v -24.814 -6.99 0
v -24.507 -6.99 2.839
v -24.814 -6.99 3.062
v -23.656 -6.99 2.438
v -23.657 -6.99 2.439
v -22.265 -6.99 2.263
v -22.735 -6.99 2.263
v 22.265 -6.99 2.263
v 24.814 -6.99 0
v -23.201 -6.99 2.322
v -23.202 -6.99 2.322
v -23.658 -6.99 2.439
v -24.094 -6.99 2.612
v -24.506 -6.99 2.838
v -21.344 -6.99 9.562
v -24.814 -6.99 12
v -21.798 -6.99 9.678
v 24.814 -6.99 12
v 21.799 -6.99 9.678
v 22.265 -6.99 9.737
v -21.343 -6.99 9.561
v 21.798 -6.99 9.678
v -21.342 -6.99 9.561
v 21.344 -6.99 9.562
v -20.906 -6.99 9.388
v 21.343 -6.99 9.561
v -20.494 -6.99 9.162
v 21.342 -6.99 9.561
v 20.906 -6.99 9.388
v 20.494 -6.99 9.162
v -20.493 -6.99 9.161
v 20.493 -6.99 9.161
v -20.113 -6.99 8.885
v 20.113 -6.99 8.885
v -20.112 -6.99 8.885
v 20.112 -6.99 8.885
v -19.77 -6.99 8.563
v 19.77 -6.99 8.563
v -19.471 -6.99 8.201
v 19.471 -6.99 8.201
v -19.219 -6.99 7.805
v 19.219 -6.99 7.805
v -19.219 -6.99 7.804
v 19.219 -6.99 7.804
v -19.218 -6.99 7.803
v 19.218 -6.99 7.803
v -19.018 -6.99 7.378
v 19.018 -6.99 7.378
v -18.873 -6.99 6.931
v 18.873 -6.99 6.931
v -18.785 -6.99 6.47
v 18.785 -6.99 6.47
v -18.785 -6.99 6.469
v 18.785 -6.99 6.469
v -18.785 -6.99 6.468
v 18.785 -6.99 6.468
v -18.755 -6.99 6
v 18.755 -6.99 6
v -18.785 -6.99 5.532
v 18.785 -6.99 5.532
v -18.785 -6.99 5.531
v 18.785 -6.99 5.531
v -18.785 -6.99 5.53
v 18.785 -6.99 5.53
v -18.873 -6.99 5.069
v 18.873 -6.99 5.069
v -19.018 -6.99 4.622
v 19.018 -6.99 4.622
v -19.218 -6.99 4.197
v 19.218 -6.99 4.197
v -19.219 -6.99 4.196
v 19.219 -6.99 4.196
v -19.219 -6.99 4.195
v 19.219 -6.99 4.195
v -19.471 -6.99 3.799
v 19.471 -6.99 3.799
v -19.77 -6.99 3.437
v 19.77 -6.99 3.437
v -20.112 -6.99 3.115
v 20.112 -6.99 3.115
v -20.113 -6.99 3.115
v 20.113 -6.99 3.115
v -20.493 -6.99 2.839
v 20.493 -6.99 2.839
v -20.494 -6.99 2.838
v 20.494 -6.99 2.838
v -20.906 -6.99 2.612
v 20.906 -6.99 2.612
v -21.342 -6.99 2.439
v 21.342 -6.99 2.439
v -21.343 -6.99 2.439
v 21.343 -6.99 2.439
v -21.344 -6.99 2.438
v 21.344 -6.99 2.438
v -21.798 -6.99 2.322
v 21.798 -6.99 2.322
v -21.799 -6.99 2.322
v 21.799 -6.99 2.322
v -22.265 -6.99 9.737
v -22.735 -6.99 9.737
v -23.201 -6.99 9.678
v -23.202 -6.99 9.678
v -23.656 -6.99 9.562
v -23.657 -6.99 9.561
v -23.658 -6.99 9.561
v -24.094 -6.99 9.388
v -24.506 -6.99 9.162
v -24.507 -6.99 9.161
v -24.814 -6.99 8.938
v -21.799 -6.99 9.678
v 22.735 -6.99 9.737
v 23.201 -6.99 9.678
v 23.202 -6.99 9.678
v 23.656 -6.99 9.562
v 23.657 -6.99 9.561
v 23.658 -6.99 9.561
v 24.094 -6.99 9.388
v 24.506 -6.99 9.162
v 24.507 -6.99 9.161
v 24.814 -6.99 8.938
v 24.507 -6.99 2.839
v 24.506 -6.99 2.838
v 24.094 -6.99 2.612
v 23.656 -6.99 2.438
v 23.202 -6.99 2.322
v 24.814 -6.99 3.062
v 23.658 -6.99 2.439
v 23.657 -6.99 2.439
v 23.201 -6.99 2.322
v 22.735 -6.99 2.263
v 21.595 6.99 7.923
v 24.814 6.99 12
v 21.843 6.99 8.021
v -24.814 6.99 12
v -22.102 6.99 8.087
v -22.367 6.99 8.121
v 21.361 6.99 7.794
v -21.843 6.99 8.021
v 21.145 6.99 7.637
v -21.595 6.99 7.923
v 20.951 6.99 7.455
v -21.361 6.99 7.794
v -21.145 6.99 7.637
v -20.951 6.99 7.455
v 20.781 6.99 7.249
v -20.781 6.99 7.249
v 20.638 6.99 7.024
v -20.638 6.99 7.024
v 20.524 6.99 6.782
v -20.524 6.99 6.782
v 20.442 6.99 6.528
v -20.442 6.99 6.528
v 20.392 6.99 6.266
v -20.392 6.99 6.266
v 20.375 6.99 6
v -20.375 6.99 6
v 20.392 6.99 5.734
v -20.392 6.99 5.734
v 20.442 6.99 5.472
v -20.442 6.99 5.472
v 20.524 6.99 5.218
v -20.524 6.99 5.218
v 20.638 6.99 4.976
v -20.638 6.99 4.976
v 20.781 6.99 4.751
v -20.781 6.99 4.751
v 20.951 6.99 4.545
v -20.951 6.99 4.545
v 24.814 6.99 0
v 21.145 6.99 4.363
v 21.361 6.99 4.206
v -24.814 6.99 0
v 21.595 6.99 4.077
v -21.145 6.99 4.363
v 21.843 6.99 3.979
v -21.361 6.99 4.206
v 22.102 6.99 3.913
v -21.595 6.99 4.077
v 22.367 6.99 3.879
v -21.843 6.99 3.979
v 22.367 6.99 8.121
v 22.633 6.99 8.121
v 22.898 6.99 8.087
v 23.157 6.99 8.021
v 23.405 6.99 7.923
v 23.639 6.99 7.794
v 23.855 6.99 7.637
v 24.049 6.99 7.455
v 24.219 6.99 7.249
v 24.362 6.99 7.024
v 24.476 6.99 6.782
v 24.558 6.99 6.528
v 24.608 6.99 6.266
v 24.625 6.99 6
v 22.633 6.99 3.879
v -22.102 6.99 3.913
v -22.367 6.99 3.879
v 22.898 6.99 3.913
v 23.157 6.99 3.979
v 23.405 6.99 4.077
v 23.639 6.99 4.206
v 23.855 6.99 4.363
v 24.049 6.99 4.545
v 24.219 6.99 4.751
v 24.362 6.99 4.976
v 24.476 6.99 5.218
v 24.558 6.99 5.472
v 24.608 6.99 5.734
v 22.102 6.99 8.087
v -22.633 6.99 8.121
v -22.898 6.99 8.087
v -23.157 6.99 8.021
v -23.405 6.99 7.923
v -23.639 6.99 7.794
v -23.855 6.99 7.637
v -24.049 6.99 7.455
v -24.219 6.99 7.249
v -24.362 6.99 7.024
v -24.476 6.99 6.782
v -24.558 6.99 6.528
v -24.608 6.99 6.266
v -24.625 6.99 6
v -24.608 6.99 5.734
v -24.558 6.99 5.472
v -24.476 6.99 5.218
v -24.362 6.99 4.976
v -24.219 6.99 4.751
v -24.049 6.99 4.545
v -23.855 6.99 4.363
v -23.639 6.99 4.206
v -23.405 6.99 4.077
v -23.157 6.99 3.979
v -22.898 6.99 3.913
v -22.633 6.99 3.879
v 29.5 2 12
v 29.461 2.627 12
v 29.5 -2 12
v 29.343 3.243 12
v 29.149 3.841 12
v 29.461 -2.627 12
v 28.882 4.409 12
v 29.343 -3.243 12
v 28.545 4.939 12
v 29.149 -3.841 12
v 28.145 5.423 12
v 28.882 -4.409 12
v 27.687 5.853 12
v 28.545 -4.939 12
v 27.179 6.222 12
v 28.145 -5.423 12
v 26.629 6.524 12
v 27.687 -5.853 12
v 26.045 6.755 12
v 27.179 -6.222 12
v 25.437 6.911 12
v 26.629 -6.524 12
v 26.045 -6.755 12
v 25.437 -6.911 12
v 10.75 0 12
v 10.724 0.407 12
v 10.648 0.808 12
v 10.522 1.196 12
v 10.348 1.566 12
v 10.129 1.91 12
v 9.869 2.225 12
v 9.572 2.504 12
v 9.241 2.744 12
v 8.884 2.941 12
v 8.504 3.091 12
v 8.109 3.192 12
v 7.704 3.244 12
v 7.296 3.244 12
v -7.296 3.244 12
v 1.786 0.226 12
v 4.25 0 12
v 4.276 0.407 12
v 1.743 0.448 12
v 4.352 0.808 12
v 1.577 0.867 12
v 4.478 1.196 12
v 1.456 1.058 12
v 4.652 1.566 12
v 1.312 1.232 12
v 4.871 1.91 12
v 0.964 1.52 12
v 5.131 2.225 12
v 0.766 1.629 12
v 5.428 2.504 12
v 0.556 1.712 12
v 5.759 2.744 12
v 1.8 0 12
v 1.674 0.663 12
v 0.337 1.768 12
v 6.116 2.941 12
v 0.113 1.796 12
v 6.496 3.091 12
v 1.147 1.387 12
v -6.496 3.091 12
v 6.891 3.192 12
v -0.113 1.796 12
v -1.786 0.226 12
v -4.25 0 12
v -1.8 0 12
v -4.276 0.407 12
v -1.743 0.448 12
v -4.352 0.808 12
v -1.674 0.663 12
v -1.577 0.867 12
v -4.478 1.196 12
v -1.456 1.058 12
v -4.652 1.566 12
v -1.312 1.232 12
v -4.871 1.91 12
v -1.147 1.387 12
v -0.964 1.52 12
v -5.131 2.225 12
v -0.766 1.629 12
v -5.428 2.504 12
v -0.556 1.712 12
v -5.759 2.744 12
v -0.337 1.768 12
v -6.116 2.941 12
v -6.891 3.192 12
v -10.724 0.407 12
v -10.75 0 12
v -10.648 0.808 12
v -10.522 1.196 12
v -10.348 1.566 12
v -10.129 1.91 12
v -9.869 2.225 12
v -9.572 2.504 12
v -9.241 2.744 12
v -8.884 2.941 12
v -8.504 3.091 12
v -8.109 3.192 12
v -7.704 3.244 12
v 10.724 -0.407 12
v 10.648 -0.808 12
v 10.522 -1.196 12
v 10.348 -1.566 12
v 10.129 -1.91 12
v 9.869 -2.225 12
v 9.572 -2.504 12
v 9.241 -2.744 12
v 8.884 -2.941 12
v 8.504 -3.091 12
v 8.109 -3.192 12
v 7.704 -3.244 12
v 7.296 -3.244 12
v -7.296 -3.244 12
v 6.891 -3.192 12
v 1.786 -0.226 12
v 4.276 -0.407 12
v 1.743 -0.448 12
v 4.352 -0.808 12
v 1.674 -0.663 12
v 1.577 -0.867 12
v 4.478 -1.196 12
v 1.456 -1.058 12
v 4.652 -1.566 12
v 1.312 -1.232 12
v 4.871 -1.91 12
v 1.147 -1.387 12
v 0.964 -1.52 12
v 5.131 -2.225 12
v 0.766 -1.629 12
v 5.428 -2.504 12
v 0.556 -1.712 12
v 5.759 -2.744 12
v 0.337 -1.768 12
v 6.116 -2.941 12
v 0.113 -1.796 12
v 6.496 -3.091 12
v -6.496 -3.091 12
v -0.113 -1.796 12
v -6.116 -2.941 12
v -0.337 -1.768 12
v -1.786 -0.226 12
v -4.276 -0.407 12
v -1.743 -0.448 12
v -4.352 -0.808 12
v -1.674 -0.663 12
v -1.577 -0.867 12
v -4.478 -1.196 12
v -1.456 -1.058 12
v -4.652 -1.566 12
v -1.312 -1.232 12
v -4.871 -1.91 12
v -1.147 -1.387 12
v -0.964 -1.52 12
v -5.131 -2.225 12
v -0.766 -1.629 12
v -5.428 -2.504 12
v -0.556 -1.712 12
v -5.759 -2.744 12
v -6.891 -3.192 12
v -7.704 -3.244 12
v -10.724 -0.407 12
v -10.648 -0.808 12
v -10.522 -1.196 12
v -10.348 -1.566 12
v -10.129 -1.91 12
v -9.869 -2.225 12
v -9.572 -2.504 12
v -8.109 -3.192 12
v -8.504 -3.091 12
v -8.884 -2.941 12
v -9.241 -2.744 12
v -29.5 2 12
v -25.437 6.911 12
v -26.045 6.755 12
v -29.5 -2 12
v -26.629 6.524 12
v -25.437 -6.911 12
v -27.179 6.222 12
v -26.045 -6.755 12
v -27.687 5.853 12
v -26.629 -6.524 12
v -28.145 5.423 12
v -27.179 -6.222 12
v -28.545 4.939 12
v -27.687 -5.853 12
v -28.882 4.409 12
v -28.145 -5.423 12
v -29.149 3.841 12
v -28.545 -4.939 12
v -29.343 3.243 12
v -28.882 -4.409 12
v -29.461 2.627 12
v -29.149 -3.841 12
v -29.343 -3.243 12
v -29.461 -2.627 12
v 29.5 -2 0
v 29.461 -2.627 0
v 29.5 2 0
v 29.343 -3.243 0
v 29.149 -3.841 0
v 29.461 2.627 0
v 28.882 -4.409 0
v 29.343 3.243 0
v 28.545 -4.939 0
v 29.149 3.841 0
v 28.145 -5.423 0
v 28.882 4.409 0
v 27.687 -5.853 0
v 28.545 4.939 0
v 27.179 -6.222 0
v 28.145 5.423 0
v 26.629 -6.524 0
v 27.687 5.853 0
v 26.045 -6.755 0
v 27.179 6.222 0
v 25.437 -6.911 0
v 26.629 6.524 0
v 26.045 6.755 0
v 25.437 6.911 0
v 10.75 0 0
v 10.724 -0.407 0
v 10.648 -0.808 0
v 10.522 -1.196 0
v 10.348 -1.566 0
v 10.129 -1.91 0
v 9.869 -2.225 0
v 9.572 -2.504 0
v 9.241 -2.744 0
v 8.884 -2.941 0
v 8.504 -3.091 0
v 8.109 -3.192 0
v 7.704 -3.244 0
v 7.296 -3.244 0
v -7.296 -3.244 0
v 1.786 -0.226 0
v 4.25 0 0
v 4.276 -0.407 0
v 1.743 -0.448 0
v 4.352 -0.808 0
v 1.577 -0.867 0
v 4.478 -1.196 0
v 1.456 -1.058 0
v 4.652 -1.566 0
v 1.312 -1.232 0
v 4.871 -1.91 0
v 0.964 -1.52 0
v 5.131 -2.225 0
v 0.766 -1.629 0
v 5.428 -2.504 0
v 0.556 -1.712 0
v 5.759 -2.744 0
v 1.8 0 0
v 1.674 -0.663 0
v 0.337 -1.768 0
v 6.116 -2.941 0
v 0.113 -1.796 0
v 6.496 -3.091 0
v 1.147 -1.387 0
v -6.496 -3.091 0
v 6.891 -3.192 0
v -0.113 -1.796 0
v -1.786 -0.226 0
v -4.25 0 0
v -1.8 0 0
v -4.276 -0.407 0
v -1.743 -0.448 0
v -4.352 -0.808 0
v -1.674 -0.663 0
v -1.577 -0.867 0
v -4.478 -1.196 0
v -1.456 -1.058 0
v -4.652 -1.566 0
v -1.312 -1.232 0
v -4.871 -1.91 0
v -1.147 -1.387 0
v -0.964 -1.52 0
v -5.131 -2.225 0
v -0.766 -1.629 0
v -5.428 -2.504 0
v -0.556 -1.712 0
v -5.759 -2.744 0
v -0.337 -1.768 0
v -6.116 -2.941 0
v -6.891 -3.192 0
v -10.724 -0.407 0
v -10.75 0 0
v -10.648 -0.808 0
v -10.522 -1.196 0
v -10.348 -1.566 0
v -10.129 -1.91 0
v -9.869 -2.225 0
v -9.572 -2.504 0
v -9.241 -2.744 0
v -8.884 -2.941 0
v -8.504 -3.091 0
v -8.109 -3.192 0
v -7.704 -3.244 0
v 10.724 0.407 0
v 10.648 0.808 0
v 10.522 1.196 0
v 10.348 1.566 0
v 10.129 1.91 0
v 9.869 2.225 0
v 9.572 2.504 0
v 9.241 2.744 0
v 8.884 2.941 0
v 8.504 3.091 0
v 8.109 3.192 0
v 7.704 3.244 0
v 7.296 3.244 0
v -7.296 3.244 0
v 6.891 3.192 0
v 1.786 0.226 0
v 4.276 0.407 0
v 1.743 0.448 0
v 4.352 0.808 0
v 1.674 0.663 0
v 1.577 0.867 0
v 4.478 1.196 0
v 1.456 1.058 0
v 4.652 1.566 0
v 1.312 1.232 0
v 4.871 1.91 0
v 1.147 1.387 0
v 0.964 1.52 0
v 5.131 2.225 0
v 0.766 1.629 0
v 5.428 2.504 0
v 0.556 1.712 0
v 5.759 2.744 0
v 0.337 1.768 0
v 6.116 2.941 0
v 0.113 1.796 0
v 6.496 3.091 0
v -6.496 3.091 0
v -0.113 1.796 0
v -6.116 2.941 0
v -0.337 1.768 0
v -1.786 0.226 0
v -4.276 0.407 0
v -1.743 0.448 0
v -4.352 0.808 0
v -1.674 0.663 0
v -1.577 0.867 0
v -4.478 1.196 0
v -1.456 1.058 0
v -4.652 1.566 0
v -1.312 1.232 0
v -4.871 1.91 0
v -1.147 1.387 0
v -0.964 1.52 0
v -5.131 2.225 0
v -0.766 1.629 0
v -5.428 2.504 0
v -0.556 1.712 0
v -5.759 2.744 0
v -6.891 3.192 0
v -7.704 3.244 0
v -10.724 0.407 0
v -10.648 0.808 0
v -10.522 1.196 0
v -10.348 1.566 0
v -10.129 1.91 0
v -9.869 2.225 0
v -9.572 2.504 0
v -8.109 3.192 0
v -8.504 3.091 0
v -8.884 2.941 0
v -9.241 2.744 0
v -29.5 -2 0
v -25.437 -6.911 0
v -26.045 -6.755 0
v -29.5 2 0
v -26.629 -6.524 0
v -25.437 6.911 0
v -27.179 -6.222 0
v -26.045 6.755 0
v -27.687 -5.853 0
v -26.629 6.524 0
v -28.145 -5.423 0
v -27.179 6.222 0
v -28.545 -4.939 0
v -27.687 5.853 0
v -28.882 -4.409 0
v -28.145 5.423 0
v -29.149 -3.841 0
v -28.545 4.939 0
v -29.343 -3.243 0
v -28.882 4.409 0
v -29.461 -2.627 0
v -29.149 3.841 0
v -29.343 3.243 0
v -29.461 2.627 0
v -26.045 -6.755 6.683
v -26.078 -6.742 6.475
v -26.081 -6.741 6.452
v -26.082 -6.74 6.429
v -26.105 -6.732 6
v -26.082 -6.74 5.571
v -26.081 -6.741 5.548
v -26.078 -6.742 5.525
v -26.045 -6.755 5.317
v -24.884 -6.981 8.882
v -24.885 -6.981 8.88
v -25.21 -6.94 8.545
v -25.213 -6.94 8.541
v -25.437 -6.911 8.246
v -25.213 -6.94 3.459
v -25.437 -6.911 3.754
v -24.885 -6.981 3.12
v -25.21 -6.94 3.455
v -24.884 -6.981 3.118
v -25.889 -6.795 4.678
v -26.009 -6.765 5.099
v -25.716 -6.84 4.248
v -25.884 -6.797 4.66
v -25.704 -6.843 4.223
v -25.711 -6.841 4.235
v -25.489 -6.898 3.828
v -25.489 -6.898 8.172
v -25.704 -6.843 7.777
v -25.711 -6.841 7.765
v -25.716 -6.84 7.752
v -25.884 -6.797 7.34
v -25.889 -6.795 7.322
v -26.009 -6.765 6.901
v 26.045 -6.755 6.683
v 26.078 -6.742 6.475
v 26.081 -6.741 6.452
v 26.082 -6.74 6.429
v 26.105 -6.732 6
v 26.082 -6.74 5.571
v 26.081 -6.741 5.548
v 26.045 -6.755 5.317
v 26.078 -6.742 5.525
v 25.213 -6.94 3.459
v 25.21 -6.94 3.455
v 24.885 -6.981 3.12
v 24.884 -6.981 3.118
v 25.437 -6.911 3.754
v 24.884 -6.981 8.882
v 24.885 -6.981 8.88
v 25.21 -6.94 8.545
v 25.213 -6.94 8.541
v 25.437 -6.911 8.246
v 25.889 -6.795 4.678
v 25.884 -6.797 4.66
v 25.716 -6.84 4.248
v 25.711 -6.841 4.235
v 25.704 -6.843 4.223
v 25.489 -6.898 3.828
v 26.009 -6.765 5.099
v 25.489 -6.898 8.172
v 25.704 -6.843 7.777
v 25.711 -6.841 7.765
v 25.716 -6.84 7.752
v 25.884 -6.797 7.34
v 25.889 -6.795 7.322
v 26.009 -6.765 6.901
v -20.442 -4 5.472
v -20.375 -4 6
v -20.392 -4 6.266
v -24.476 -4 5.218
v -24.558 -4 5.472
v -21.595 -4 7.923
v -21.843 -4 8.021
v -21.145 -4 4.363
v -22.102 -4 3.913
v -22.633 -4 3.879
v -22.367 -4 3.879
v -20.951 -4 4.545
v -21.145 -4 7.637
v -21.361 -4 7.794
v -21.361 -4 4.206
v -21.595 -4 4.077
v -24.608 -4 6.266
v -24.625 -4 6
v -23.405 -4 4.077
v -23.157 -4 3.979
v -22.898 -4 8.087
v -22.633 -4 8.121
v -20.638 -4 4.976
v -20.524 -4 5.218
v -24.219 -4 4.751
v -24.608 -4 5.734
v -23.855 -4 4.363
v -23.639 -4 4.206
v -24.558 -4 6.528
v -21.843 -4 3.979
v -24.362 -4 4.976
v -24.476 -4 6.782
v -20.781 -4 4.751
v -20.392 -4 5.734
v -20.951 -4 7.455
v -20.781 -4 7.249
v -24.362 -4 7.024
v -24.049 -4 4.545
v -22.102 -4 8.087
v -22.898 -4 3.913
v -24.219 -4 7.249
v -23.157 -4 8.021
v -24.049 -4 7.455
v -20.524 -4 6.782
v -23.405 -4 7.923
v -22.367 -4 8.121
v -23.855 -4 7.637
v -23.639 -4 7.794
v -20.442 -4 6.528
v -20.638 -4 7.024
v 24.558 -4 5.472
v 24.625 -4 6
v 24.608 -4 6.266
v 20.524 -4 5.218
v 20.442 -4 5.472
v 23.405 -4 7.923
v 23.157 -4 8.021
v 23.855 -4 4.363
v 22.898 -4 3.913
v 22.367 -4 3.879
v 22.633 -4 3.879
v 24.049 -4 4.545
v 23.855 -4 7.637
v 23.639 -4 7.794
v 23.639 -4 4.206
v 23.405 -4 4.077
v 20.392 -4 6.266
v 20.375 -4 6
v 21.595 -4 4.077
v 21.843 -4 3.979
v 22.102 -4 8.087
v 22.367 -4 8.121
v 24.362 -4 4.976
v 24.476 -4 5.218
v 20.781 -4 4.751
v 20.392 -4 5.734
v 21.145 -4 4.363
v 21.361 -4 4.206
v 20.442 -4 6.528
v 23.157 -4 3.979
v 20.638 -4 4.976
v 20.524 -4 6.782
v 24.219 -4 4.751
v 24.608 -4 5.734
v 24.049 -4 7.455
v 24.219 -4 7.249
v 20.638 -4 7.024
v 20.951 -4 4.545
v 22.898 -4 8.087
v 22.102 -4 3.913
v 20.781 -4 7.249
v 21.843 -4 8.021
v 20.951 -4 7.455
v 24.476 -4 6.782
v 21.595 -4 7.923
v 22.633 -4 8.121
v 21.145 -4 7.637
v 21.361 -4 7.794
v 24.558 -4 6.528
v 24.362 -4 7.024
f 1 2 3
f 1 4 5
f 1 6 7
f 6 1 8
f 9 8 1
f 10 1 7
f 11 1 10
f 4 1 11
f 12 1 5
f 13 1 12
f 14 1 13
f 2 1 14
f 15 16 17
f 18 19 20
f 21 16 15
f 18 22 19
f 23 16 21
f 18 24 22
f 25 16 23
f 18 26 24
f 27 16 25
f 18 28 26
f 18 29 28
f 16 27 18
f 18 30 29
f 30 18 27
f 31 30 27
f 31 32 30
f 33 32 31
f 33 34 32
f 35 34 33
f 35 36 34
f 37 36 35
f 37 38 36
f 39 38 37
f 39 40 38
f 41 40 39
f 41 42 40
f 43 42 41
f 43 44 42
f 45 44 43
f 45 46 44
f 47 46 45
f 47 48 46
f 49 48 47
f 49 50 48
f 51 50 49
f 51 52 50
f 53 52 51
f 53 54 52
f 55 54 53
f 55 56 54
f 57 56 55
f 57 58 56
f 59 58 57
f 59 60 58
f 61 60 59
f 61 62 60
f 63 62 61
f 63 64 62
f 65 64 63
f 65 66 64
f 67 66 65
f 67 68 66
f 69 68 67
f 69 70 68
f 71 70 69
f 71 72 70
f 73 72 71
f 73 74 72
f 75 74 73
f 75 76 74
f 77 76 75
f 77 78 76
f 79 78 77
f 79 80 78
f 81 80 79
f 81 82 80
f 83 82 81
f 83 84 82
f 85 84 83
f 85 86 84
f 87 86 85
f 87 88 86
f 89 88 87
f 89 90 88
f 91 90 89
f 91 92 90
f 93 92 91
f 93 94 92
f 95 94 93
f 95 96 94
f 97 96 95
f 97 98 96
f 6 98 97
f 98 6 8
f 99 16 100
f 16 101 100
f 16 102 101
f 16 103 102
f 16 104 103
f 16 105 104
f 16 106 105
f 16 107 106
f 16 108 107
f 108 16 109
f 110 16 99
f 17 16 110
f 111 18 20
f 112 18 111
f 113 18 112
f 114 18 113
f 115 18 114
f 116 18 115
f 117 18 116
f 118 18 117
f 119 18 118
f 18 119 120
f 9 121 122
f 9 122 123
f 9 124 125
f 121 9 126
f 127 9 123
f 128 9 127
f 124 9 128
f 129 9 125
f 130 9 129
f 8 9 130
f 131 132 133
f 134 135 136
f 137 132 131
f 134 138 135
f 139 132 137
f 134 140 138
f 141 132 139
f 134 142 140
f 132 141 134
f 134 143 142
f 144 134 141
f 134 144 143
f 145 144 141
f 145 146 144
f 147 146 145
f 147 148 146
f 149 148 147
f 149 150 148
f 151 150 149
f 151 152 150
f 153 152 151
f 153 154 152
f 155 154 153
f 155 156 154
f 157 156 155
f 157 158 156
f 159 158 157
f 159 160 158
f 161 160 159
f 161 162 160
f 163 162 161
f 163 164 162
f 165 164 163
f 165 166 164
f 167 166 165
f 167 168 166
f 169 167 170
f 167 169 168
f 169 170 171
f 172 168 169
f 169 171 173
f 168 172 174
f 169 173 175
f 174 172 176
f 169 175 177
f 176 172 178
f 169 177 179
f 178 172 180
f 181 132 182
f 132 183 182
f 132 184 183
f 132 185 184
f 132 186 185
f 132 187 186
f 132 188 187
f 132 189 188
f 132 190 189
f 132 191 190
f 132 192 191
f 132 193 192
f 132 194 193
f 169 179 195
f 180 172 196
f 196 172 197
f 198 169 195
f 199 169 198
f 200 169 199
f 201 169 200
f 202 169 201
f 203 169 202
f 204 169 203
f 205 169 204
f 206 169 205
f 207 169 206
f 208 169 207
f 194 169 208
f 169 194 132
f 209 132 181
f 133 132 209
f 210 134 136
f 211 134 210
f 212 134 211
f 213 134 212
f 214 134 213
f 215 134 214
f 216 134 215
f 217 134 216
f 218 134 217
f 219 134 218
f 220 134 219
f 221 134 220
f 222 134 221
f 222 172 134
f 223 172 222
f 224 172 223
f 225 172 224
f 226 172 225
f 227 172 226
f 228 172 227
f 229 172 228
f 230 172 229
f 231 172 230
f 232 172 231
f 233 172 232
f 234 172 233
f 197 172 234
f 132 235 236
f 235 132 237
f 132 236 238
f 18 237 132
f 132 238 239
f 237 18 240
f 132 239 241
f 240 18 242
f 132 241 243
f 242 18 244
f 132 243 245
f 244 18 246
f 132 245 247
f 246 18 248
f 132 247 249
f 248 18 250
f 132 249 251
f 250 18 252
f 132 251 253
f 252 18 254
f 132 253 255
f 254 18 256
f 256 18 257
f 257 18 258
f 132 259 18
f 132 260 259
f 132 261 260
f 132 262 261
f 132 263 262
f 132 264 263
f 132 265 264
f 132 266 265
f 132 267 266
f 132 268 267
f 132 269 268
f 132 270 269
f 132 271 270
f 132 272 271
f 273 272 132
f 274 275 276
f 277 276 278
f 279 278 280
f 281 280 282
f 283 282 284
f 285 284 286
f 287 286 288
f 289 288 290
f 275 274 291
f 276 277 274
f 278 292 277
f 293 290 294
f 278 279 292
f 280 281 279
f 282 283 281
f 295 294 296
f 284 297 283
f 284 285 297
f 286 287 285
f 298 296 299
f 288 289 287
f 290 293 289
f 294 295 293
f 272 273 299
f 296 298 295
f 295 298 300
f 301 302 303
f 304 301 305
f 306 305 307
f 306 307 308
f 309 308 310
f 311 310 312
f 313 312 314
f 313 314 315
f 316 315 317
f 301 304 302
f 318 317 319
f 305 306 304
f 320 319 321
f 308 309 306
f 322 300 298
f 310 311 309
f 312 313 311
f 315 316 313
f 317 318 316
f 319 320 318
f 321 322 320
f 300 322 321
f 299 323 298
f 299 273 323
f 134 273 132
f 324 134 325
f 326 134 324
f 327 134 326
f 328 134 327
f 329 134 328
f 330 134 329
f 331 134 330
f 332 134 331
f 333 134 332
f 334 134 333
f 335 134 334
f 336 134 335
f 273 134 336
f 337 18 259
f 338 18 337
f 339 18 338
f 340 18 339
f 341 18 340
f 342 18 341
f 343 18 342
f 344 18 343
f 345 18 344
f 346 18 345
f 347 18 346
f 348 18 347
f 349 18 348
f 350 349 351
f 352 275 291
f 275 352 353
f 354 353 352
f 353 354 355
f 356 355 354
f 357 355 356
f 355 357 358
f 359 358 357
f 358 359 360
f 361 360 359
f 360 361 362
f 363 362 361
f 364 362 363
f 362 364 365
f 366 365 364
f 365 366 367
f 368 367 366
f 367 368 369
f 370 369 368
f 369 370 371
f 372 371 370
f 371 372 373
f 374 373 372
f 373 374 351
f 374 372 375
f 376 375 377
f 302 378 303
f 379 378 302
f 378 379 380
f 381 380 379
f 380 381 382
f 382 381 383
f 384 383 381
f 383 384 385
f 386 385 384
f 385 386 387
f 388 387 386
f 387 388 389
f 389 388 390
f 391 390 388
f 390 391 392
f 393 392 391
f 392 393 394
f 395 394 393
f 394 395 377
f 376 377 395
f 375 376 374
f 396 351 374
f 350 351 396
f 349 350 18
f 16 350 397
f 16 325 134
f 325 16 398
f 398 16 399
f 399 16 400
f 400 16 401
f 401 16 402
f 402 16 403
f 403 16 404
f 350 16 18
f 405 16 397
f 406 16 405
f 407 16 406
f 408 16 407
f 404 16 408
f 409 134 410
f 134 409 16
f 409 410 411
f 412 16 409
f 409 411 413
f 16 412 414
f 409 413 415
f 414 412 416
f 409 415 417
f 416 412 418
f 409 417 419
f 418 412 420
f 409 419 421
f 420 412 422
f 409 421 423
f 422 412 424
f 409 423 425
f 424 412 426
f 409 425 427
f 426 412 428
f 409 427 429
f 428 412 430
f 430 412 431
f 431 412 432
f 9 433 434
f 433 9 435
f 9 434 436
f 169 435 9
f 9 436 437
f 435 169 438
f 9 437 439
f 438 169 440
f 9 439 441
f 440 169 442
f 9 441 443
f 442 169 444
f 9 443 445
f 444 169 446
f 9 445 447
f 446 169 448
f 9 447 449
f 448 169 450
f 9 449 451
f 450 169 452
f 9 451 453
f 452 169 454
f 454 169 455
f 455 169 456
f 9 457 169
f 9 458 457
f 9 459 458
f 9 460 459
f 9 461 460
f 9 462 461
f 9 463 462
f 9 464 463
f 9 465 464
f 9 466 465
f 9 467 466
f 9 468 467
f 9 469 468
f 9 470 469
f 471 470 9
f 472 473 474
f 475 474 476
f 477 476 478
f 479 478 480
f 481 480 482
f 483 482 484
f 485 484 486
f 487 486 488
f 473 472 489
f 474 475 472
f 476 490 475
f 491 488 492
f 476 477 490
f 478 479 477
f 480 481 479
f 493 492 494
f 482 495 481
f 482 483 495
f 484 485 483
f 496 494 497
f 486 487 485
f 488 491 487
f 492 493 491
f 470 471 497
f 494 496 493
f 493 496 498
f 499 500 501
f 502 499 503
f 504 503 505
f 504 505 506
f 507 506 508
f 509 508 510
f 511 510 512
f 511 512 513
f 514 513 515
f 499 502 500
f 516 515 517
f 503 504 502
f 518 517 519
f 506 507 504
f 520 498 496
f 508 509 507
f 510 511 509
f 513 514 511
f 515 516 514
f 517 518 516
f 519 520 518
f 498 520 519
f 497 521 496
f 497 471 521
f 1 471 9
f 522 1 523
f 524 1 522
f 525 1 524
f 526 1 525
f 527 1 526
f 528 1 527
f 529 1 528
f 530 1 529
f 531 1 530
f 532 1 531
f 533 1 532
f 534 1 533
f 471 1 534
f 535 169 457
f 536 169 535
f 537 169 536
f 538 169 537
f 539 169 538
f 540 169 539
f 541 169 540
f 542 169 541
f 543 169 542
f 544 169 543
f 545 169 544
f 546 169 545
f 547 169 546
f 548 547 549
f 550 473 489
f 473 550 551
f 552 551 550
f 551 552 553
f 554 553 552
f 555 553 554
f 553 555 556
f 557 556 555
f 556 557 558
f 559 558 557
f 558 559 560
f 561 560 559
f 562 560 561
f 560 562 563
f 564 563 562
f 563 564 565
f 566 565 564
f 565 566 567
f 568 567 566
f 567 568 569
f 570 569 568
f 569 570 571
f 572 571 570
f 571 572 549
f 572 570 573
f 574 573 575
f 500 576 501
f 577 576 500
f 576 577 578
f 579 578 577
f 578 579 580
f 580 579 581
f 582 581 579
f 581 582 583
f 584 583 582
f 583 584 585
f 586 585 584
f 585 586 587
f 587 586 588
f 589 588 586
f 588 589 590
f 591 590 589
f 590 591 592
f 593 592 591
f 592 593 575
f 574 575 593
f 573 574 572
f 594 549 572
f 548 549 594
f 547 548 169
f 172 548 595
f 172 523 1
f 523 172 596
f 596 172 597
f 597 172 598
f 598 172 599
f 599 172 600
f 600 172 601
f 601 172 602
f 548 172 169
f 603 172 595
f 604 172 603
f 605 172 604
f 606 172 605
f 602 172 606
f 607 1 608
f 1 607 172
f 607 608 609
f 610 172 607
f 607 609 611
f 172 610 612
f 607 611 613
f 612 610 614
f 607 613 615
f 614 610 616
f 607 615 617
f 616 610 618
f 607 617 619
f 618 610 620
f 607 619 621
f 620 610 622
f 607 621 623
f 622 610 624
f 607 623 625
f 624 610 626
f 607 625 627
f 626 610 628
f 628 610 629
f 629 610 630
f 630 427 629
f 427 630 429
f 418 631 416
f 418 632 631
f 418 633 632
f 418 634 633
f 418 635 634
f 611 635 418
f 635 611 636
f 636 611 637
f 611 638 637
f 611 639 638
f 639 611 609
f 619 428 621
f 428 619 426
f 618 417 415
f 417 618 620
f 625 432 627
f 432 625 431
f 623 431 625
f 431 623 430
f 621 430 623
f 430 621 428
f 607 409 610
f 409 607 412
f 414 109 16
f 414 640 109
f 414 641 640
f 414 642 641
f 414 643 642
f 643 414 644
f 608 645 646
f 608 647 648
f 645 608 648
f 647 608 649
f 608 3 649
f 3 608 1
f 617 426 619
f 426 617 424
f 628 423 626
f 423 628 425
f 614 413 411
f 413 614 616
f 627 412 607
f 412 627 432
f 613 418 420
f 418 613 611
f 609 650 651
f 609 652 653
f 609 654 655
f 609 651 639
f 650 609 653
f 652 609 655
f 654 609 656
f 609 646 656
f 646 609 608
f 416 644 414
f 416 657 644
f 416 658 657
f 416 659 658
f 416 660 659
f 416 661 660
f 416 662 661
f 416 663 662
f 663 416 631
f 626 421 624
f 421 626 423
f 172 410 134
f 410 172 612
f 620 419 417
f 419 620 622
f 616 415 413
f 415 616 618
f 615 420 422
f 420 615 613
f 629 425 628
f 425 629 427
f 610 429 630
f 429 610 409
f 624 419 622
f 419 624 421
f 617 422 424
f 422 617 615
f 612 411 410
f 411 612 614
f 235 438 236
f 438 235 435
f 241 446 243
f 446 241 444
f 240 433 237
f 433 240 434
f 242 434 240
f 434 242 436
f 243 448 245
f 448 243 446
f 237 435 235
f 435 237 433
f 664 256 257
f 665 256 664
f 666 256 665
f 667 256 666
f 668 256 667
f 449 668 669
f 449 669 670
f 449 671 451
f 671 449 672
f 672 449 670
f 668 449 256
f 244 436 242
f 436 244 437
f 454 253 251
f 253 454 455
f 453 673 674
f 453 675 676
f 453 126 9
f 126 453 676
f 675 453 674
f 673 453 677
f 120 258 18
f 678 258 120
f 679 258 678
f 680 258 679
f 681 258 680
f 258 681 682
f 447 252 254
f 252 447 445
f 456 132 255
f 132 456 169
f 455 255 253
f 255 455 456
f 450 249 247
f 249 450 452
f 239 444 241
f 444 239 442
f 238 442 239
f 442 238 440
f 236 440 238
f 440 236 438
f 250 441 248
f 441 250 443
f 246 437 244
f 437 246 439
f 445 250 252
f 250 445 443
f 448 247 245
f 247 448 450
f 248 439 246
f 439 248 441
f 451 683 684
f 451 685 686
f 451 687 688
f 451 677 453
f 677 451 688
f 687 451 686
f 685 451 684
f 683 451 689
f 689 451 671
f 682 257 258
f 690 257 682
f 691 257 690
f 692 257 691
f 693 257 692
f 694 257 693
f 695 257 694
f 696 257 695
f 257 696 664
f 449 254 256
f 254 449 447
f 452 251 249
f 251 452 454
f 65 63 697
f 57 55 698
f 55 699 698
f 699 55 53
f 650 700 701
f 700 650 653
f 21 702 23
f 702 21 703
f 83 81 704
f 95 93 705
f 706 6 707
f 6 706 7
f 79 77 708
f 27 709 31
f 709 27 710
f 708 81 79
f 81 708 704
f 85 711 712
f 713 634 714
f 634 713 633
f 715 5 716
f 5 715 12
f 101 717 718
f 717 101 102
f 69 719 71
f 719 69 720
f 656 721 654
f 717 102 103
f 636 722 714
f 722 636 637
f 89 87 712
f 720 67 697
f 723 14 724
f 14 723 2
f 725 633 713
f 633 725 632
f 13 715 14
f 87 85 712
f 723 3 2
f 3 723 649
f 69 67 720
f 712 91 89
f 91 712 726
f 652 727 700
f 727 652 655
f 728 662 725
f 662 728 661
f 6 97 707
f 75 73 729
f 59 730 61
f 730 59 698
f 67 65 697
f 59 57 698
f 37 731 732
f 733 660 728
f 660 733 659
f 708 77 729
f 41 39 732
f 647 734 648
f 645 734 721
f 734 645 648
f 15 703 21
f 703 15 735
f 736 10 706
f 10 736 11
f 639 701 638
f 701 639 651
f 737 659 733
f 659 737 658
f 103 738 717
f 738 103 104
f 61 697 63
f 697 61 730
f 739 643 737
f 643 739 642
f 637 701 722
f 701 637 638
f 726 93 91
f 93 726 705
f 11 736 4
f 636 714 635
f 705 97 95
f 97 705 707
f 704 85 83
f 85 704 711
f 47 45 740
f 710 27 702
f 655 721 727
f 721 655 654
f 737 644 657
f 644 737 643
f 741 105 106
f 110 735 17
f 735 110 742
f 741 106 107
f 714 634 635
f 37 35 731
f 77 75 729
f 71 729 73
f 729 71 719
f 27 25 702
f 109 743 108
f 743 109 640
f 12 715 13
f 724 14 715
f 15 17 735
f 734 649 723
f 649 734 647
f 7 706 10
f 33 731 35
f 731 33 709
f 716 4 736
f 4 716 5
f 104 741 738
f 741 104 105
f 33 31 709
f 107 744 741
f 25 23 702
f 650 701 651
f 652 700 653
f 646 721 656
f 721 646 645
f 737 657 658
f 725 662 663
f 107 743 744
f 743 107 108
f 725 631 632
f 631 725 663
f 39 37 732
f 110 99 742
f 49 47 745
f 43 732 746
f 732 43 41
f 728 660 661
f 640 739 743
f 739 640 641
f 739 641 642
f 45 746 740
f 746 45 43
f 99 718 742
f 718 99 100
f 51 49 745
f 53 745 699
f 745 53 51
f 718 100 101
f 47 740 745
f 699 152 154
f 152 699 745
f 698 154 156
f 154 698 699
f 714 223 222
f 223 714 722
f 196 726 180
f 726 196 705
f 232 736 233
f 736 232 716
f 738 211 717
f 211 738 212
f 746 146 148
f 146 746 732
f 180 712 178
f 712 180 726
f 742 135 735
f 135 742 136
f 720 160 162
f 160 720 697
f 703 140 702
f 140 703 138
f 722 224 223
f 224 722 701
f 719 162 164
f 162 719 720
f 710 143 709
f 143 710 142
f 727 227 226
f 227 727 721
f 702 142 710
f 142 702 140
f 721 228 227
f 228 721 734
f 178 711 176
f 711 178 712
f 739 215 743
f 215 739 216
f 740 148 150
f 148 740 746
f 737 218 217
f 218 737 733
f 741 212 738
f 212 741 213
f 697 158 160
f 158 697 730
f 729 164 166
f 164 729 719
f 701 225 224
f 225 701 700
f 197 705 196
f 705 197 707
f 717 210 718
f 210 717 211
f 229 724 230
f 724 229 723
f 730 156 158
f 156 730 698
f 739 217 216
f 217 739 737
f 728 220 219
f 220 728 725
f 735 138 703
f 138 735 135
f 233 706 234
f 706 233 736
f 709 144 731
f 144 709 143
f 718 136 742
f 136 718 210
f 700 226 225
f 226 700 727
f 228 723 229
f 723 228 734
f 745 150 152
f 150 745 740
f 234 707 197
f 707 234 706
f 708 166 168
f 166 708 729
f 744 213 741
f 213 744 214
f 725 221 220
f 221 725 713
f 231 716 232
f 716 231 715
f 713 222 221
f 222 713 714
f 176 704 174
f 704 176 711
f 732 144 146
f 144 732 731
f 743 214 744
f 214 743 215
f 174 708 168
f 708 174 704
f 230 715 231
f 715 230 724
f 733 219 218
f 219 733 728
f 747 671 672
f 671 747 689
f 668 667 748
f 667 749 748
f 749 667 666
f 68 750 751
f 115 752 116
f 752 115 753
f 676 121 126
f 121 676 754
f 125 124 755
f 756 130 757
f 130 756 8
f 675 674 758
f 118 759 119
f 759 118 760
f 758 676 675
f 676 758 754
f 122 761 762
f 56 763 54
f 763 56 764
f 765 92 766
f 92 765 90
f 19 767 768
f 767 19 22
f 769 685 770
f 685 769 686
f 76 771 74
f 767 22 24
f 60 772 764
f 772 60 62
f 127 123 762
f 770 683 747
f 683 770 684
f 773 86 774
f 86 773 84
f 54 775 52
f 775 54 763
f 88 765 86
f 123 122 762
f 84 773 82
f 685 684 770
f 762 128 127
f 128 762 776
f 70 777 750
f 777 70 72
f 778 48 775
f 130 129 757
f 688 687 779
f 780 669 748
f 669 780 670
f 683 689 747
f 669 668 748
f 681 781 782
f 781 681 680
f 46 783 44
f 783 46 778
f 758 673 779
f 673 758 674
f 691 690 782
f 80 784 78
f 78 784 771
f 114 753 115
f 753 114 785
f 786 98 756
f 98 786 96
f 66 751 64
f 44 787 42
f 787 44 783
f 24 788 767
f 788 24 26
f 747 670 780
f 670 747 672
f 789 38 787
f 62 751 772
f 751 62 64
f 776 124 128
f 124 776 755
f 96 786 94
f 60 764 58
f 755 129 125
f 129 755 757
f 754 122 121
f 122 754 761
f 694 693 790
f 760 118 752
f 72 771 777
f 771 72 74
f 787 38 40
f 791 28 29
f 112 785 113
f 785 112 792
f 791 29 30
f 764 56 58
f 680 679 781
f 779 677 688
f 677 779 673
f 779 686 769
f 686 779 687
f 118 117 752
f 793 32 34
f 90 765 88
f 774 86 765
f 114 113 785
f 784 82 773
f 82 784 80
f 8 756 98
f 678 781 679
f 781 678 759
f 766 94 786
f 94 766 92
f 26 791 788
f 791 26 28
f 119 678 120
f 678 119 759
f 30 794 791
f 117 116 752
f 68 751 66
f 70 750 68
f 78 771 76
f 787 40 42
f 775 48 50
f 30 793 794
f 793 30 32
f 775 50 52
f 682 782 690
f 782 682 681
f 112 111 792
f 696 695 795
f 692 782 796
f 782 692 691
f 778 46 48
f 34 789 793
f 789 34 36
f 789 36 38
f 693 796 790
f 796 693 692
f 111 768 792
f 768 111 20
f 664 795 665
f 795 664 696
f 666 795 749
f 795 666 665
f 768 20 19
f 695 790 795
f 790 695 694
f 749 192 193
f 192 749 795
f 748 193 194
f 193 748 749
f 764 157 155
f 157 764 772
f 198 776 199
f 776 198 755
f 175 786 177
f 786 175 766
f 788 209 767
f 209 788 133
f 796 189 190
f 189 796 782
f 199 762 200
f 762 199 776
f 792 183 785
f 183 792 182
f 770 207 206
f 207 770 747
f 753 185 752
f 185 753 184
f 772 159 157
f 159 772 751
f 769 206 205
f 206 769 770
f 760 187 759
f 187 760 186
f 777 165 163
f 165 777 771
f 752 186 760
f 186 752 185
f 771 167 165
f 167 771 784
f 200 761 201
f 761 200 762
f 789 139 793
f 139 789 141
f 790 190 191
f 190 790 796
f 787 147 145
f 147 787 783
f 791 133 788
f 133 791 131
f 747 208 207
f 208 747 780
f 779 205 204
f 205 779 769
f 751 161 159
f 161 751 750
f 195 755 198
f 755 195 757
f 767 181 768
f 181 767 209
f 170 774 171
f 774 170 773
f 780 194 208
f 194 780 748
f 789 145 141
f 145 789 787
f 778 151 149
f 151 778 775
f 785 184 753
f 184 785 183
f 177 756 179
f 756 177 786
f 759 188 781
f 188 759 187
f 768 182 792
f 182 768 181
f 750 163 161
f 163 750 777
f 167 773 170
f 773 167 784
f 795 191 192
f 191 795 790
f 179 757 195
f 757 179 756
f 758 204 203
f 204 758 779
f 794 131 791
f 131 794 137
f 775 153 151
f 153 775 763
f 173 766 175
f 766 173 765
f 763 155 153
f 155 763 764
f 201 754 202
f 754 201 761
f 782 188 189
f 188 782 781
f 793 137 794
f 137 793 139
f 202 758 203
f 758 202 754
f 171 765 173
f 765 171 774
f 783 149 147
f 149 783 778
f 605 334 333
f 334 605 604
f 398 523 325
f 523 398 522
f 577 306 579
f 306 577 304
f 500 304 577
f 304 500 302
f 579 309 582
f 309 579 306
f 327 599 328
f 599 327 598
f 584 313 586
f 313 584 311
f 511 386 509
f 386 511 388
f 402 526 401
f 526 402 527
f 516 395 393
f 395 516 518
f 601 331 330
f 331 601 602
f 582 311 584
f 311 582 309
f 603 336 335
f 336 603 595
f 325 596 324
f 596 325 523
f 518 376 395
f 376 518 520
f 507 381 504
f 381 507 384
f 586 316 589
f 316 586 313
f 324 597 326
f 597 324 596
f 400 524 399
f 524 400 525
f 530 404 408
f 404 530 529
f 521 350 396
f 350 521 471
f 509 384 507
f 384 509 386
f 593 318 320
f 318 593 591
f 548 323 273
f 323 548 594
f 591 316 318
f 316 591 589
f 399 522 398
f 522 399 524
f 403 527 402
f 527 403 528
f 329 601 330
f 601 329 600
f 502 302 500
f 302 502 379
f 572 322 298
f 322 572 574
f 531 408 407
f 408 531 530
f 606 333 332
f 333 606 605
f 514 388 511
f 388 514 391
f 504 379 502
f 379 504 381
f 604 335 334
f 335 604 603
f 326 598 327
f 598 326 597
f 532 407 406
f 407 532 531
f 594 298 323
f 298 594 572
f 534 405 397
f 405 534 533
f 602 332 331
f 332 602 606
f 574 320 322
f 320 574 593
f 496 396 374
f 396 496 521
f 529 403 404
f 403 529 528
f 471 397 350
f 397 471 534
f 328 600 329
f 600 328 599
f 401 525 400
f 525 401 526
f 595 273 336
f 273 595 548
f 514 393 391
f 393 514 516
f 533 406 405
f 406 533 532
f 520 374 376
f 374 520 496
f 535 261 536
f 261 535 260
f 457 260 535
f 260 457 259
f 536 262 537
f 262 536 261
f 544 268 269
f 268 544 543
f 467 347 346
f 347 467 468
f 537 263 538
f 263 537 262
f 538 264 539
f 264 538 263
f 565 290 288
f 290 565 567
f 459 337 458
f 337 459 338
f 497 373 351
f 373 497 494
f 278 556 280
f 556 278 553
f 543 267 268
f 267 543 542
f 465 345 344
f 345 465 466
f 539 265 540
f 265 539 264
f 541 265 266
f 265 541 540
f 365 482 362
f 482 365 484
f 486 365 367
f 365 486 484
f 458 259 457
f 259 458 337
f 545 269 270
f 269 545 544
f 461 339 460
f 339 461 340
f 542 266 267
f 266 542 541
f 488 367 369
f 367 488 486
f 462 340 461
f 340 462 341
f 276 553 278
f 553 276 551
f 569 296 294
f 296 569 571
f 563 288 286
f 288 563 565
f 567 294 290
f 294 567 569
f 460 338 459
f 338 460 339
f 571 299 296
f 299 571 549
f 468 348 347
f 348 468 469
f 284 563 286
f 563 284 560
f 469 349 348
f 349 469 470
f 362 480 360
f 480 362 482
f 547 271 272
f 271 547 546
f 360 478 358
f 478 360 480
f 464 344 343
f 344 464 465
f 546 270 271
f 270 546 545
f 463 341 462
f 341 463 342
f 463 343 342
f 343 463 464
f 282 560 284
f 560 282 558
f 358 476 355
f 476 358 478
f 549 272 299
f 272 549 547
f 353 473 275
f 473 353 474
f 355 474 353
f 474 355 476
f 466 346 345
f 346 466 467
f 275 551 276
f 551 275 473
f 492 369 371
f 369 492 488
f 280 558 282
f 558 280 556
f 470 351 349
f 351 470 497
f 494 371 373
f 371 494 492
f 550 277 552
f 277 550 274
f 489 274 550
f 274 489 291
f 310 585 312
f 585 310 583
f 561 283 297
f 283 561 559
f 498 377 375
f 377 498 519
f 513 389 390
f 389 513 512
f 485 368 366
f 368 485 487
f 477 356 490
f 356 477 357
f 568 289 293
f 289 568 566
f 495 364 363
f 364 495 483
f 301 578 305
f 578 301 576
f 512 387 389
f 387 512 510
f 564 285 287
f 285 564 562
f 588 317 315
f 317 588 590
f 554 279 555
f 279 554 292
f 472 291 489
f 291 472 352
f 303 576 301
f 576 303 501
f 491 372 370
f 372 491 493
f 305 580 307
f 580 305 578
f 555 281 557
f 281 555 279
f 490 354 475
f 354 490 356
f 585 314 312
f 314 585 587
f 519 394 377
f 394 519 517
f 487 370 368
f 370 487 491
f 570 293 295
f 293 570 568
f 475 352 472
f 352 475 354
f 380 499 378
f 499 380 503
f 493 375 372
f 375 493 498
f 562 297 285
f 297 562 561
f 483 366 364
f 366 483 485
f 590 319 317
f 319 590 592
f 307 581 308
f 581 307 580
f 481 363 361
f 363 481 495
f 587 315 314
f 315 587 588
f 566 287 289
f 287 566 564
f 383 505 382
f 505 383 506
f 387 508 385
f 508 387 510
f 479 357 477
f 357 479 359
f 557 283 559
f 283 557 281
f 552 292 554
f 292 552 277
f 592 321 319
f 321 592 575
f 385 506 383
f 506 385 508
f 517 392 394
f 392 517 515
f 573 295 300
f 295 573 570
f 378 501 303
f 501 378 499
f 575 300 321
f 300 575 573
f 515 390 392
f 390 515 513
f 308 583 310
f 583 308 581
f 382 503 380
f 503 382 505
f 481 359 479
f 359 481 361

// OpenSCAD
$fn = 50;


difference() {
	union() {
		hull() {
			translate(v = [-9.5000000000, 2.0000000000, 0]) {
				cylinder(h = 12, r = 5);
			}
			translate(v = [9.5000000000, 2.0000000000, 0]) {
				cylinder(h = 12, r = 5);
			}
			translate(v = [-9.5000000000, -2.0000000000, 0]) {
				cylinder(h = 12, r = 5);
			}
			translate(v = [9.5000000000, -2.0000000000, 0]) {
				cylinder(h = 12, r = 5);
			}
		}
		translate(v = [-15.0000000000, 0.0000000000, 0]) {
			hull() {
				translate(v = [-9.5000000000, 2.0000000000, 0]) {
					cylinder(h = 12, r = 5);
				}
				translate(v = [9.5000000000, 2.0000000000, 0]) {
					cylinder(h = 12, r = 5);
				}
				translate(v = [-9.5000000000, -2.0000000000, 0]) {
					cylinder(h = 12, r = 5);
				}
				translate(v = [9.5000000000, -2.0000000000, 0]) {
					cylinder(h = 12, r = 5);
				}
			}
		}
		translate(v = [-15.0000000000, 0.0000000000, 0]) {
			hull() {
				translate(v = [-9.5000000000, 2.0000000000, 0]) {
					cylinder(h = 12, r = 5);
				}
				translate(v = [9.5000000000, 2.0000000000, 0]) {
					cylinder(h = 12, r = 5);
				}
				translate(v = [-9.5000000000, -2.0000000000, 0]) {
					cylinder(h = 12, r = 5);
				}
				translate(v = [9.5000000000, -2.0000000000, 0]) {
					cylinder(h = 12, r = 5);
				}
			}
		}
		translate(v = [15.0000000000, 0.0000000000, 0]) {
			hull() {
				translate(v = [-9.5000000000, 2.0000000000, 0]) {
					cylinder(h = 12, r = 5);
				}
				translate(v = [9.5000000000, 2.0000000000, 0]) {
					cylinder(h = 12, r = 5);
				}
				translate(v = [-9.5000000000, -2.0000000000, 0]) {
					cylinder(h = 12, r = 5);
				}
				translate(v = [9.5000000000, -2.0000000000, 0]) {
					cylinder(h = 12, r = 5);
				}
			}
		}
		translate(v = [15.0000000000, 0.0000000000, 0]) {
			hull() {
				translate(v = [-9.5000000000, 2.0000000000, 0]) {
					cylinder(h = 12, r = 5);
				}
				translate(v = [9.5000000000, 2.0000000000, 0]) {
					cylinder(h = 12, r = 5);
				}
				translate(v = [-9.5000000000, -2.0000000000, 0]) {
					cylinder(h = 12, r = 5);
				}
				translate(v = [9.5000000000, -2.0000000000, 0]) {
					cylinder(h = 12, r = 5);
				}
			}
		}
	}
	union() {
		translate(v = [-22.5000000000, -7.0000000000, 6.0000000000]) {
			rotate(a = [90, 0, 0]) {
				difference() {
					union() {
						#translate(v = [0, 0, -14.0000000000]) {
							cylinder(h = 14, r = 2.0000000000);
						}
						#translate(v = [0, 0, -3]) {
							cylinder(h = 3, r1 = 2.1250000000, r2 = 3.7500000000);
						}
						#translate(v = [0, 0, -14.0000000000]) {
							cylinder(h = 14, r = 2.1250000000);
						}
						#translate(v = [0, 0, -14.0000000000]) {
							cylinder(h = 14, r = 2.0000000000);
						}
					}
					union();
				}
			}
		}
		translate(v = [22.5000000000, -7.0000000000, 6.0000000000]) {
			rotate(a = [90, 0, 0]) {
				difference() {
					union() {
						#translate(v = [0, 0, -14.0000000000]) {
							cylinder(h = 14, r = 2.0000000000);
						}
						#translate(v = [0, 0, -3]) {
							cylinder(h = 3, r1 = 2.1250000000, r2 = 3.7500000000);
						}
						#translate(v = [0, 0, -14.0000000000]) {
							cylinder(h = 14, r = 2.1250000000);
						}
						#translate(v = [0, 0, -14.0000000000]) {
							cylinder(h = 14, r = 2.0000000000);
						}
					}
					union();
				}
			}
		}
		translate(v = [-7.5000000000, 0.0000000000, 0]) {
			translate(v = [0, 0, -100]) {
				cylinder(h = 200, r = 3.2500000000);
			}
		}
		translate(v = [7.5000000000, 0.0000000000, 0]) {
			translate(v = [0, 0, -100]) {
				cylinder(h = 200, r = 3.2500000000);
			}
		}
		translate(v = [-7.5000000000, 0.0000000000, 0]) {
			translate(v = [0, 0, -100]) {
				cylinder(h = 200, r = 1.8000000000);
			}
		}
		translate(v = [0, 0, -100]) {
			cylinder(h = 200, r = 1.8000000000);
		}
		translate(v = [7.5000000000, 0.0000000000, 0]) {
			translate(v = [0, 0, -100]) {
				cylinder(h = 200, r = 1.8000000000);
			}
		}
	}
}
